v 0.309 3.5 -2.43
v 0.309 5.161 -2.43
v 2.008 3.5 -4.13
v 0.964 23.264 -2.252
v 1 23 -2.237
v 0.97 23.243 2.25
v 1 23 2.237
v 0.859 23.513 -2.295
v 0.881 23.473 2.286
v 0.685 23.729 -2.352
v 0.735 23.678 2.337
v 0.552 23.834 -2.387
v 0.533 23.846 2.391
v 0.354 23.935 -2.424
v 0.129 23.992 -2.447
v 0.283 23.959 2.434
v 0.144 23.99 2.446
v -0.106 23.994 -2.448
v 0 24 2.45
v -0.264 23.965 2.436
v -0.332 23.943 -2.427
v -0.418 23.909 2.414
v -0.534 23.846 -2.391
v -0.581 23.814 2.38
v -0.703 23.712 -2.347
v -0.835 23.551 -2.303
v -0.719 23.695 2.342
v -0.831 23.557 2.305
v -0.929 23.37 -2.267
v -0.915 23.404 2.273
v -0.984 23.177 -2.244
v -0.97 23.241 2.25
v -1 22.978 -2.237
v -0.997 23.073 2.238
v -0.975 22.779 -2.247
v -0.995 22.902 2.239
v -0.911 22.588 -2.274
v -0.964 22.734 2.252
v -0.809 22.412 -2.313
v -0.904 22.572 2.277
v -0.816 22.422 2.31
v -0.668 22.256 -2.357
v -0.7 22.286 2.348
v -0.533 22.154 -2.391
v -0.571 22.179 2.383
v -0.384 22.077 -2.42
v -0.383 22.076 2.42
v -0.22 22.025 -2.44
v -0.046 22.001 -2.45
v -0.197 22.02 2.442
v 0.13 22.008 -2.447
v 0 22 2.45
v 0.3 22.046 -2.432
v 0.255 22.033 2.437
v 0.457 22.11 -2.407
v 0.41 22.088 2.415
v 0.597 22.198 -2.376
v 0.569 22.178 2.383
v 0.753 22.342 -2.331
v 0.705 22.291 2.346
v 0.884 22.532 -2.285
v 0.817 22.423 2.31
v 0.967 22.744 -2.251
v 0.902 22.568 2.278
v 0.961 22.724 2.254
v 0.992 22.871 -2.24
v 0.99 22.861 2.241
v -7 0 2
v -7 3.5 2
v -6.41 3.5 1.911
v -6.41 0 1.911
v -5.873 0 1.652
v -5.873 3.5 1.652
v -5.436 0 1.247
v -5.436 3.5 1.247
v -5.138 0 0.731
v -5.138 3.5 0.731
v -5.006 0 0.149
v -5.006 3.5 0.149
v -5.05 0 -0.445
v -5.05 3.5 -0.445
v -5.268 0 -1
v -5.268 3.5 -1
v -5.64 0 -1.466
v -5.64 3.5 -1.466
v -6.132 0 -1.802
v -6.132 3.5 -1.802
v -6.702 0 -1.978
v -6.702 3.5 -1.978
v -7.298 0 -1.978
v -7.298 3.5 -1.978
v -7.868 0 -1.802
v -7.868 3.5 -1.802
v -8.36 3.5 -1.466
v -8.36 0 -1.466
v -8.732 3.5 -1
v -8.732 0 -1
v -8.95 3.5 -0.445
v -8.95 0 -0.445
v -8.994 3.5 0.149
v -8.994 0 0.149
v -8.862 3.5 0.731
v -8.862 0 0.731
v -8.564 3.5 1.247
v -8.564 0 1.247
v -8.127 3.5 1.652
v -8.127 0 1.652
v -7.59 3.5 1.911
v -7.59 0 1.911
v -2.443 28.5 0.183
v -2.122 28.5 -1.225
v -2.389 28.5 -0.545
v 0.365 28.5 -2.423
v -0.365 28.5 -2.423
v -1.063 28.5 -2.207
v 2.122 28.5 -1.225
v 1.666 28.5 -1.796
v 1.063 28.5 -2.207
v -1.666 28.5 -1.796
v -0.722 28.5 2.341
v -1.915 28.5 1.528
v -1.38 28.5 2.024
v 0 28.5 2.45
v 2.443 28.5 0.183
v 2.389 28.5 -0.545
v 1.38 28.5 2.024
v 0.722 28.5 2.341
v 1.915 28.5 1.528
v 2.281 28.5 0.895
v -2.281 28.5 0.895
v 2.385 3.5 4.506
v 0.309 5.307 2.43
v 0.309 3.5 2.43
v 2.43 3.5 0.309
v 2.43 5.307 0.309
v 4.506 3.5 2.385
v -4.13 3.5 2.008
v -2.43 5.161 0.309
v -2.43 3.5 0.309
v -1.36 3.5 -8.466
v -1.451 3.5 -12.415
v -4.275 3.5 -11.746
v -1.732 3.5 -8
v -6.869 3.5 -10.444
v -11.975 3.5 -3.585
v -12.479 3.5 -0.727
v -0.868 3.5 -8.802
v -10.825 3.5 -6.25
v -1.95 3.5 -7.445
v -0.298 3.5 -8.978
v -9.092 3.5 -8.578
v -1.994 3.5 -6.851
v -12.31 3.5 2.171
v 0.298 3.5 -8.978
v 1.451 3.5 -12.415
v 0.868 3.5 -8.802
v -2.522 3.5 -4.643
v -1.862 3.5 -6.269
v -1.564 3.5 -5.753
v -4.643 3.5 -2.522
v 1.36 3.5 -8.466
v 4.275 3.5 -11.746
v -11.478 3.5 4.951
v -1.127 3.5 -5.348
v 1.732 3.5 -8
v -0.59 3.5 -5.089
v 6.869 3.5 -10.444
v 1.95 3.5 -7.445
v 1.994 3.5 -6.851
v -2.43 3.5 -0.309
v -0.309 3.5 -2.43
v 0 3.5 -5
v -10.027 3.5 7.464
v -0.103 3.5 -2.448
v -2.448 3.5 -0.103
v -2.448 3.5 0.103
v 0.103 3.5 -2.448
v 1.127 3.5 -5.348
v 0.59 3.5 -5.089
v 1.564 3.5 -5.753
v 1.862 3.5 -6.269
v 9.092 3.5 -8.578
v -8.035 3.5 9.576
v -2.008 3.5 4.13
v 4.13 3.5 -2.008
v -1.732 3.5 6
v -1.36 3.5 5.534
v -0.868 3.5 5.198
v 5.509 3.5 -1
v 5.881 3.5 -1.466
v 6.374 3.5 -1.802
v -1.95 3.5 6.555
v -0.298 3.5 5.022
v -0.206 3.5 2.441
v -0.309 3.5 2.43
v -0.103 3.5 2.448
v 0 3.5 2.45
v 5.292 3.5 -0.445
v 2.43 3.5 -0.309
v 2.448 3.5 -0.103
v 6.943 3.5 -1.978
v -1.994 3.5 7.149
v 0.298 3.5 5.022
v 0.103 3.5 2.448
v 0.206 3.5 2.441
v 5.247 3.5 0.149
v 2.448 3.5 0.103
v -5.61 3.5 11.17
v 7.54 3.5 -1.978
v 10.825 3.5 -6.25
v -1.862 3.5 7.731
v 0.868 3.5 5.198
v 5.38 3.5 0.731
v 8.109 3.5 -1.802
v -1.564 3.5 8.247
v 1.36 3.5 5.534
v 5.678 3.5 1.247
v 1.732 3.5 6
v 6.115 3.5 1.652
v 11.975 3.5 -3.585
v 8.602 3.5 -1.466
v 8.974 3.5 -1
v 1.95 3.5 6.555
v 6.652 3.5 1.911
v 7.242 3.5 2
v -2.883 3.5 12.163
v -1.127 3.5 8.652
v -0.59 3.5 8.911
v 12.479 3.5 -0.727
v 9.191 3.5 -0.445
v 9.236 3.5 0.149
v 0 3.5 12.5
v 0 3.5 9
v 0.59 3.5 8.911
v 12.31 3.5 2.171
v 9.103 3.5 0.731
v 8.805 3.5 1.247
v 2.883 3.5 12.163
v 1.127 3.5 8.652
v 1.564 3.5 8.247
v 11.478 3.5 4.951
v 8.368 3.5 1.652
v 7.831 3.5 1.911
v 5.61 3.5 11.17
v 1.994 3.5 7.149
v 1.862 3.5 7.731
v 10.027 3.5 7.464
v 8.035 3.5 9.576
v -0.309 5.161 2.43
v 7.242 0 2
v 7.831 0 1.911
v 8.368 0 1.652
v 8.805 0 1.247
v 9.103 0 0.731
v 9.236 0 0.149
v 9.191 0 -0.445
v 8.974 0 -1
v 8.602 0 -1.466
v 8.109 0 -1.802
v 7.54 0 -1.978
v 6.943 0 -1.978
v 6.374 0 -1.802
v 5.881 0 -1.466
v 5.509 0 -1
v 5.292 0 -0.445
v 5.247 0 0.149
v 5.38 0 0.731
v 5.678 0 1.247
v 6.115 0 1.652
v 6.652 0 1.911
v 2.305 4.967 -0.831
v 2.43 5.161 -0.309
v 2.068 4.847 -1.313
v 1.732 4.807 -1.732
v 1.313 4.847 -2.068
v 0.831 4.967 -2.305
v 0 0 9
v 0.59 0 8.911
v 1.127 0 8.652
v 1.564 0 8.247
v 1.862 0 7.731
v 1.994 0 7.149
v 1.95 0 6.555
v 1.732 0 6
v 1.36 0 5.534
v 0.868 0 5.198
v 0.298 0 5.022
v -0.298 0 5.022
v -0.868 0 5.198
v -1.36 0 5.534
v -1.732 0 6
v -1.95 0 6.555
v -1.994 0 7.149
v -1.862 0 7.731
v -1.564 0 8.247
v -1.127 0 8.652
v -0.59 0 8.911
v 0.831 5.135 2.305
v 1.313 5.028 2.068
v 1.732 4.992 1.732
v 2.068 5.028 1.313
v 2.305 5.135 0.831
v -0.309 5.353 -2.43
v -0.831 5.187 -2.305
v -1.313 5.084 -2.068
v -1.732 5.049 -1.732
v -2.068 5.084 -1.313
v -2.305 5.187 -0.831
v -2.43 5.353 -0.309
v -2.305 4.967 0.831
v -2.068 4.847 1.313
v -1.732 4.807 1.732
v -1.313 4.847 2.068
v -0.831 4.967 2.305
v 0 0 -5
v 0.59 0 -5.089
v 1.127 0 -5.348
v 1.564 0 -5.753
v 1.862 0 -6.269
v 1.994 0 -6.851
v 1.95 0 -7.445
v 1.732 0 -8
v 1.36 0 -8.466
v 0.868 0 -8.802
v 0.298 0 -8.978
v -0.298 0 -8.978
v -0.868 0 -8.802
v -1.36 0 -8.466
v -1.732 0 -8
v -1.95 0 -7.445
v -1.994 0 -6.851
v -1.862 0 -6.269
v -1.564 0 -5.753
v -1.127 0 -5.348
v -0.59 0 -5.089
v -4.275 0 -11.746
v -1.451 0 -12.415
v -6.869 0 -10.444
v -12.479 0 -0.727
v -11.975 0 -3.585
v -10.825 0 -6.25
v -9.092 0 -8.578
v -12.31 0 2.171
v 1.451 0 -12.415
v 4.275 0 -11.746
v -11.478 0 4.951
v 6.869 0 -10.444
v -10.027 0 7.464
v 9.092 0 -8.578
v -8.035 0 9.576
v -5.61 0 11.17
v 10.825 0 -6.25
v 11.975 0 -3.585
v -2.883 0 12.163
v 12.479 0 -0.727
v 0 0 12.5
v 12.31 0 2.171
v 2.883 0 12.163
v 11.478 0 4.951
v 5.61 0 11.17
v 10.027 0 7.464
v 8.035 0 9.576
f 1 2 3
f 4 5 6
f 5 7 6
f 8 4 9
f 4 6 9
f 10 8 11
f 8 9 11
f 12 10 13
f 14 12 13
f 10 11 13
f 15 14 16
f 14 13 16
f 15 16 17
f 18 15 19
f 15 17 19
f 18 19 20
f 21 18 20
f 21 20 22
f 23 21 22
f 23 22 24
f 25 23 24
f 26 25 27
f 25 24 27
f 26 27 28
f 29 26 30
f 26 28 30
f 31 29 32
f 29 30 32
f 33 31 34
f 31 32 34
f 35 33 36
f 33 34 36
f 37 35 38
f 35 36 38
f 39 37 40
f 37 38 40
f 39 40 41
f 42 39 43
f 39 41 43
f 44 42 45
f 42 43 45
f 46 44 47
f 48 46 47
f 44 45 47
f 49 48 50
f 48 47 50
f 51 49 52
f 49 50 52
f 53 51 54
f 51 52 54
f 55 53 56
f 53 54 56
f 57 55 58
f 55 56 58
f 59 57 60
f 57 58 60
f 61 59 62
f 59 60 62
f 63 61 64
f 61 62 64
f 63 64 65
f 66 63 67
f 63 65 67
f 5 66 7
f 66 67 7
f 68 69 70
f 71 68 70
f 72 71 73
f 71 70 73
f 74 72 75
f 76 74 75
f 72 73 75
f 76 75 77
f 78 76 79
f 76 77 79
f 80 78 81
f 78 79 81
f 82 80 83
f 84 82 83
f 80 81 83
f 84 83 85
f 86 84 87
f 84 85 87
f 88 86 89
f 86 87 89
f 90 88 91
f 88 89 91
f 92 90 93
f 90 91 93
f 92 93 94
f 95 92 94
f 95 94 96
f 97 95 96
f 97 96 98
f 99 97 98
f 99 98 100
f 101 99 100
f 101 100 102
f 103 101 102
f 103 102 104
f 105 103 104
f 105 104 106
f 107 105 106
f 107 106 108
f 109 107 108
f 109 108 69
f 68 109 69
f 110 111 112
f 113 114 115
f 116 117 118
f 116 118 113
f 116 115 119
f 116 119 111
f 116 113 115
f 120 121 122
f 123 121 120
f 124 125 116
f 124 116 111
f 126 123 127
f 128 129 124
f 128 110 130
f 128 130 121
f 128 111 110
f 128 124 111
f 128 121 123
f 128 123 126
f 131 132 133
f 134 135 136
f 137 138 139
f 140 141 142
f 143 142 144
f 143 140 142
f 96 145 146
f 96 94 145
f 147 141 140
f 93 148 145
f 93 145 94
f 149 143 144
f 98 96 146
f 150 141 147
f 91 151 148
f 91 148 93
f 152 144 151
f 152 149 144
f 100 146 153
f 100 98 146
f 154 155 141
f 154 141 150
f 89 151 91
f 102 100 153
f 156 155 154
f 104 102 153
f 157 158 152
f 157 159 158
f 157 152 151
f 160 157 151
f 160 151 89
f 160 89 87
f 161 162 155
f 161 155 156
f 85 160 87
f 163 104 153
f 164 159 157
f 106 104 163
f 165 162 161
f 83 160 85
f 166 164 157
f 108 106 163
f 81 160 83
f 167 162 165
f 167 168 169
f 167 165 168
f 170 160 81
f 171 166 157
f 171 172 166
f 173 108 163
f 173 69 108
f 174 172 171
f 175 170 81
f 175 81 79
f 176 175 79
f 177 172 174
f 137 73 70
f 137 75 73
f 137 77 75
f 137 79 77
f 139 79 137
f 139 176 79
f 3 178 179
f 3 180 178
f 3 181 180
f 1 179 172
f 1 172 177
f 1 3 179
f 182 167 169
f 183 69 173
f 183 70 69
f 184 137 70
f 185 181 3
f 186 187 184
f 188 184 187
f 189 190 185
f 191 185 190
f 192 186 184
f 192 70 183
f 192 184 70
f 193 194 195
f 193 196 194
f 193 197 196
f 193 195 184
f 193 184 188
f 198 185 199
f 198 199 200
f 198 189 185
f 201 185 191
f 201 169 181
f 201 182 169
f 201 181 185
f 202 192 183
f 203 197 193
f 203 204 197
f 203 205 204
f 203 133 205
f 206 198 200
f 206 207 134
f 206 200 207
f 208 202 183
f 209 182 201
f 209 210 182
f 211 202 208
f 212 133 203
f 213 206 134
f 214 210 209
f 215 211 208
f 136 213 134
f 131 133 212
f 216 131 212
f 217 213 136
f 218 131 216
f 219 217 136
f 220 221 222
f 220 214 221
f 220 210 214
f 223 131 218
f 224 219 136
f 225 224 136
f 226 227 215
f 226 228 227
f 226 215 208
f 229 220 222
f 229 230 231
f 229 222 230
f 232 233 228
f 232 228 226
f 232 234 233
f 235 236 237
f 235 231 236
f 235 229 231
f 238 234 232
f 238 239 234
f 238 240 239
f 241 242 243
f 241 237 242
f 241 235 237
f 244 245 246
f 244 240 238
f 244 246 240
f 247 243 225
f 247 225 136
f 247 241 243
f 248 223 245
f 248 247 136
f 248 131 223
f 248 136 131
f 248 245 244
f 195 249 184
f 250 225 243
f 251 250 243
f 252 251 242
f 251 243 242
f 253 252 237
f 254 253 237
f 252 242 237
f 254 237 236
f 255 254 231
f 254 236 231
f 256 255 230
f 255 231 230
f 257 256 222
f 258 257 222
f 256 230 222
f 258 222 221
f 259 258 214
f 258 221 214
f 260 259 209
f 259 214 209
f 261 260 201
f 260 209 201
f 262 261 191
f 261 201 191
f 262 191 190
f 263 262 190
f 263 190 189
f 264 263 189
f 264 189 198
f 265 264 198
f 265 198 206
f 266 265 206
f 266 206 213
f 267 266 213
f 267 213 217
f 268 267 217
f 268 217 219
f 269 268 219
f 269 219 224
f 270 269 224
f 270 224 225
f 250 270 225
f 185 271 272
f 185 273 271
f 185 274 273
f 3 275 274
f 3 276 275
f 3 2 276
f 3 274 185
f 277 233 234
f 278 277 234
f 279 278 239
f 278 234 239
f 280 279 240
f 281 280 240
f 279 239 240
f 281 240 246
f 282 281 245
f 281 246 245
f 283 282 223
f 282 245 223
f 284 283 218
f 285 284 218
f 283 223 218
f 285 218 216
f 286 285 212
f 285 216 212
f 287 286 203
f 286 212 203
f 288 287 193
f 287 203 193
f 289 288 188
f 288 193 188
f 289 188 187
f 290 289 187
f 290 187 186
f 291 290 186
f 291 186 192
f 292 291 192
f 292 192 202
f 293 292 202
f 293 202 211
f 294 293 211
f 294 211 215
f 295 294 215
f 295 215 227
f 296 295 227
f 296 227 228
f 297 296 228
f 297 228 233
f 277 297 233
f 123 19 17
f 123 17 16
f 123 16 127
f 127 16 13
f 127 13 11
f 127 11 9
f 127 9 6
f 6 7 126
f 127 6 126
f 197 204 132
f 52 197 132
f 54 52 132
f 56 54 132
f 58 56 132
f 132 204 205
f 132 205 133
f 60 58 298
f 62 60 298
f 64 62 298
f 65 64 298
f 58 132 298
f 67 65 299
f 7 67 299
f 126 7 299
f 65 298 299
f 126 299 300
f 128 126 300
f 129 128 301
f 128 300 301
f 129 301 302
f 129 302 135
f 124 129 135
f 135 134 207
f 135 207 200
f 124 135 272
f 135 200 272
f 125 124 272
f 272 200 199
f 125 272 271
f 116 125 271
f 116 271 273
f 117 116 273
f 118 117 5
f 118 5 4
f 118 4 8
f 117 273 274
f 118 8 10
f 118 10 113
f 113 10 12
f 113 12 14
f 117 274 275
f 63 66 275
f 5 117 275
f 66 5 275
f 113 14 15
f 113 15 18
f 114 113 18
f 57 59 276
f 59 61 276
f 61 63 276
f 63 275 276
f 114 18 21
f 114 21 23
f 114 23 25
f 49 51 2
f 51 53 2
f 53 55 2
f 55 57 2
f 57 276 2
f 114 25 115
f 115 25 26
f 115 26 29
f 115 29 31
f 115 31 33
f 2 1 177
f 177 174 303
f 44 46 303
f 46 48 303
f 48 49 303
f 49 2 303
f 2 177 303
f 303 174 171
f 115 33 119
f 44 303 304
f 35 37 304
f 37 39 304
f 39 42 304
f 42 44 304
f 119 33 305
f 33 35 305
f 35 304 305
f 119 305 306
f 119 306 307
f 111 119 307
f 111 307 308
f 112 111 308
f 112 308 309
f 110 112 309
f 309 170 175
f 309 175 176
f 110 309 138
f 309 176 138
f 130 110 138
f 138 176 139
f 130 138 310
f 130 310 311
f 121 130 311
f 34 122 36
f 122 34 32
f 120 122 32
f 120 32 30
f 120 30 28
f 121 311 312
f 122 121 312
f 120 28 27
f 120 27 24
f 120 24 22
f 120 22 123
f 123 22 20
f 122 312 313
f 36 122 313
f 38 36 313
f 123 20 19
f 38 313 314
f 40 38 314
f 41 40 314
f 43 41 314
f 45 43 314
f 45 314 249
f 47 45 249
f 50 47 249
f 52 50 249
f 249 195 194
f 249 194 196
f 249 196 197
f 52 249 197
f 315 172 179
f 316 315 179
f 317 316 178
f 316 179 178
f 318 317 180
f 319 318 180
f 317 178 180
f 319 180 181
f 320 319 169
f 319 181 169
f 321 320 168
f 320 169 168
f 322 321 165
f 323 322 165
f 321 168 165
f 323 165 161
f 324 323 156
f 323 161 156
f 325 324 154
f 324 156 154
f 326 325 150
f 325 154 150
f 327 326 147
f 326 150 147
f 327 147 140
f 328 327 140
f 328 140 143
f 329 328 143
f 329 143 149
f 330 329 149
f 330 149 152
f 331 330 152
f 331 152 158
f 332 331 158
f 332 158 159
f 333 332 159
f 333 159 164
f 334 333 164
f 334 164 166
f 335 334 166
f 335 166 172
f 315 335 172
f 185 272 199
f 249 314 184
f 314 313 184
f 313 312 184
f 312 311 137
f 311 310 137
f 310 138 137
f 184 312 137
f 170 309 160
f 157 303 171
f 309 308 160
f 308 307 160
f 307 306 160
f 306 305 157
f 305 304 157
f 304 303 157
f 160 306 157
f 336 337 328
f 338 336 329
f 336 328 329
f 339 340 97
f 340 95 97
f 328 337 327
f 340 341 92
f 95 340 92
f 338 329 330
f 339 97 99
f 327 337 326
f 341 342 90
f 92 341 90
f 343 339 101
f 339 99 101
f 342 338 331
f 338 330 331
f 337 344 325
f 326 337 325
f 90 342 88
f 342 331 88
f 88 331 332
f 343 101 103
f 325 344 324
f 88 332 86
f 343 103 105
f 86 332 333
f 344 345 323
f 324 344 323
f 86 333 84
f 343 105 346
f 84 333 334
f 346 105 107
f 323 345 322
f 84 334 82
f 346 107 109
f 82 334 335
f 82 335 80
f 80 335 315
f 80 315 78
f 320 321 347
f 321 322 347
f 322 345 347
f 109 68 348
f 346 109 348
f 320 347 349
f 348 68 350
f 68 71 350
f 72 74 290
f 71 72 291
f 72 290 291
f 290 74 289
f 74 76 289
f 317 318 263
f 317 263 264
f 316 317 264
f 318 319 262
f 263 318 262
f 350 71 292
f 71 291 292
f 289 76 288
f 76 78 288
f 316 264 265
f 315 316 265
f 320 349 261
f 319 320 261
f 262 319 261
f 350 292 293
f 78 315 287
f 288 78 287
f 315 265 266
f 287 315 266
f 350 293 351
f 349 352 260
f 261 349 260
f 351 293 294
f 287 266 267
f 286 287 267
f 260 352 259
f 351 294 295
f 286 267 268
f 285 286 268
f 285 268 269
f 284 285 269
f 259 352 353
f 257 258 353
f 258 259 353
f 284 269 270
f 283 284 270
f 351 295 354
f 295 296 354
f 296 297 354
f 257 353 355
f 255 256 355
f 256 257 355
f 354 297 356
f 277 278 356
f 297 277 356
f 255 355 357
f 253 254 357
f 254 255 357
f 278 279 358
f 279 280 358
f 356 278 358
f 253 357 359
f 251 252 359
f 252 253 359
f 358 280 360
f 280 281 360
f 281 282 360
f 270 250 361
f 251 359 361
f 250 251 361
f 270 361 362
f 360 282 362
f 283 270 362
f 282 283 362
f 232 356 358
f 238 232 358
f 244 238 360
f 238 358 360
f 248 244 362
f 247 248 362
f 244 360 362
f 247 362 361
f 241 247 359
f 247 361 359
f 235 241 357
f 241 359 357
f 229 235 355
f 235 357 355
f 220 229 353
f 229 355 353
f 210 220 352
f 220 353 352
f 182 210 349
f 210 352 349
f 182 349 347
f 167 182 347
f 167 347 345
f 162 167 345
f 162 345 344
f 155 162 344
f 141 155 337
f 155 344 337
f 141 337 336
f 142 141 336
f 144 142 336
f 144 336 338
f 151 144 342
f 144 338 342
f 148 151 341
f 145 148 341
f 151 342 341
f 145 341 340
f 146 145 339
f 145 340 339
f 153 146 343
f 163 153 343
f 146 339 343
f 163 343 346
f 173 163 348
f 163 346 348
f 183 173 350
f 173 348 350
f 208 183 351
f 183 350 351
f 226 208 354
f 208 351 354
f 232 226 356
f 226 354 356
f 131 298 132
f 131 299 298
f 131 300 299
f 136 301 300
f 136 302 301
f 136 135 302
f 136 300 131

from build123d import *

# Parameters (mm, degrees)
SKETCH_1_R               = 12.5
EXTRUDE_1_DEPTH          = 3.5
SKETCH_2_R               = 2.45
EXTRUDE_2_DEPTH          = 25
SKETCH_4_R               = 2
CUT_EXTRUDE_1_DEPTH      = 31.618621785
SKETCH_4_5_R             = 2
CUT_EXTRUDE_2_DEPTH      = 31.618621785
RIB_1_REACH              = 35.537
SKETCH_8_WALL_W          = 74.969434882
SKETCH_8_WALL_H          = 3
RIB_6_REACH              = 35.537
SKETCH_9_WALL_W          = 75.07458535
SKETCH_9_WALL_H          = 3
RIB_7_REACH              = 35.537
SKETCH_11_WALL_W         = 75.144527038
SKETCH_11_WALL_H         = 3
CUT_EXTRUDE_4_DEPTH      = 30.008619409
CUT_EXTRUDE_4_DEPTH_BACK = 30.008619409
SKETCH_3D_7_R            = 1


with BuildPart() as part:
    # 草图1 → 凸台-拉伸1 (new body)
    with BuildSketch(Plane(origin=(0, 0, 0), x_dir=(1, 0, 0), z_dir=(0, 1, 0))):
        Circle(SKETCH_1_R)
    extrude(amount=EXTRUDE_1_DEPTH)

    # 草图2 → 凸台-拉伸2 (add)
    with BuildSketch(Plane(origin=(0, 3.5, 0), x_dir=(1, 0, 0), z_dir=(0, 1, 0))):
        Circle(SKETCH_2_R)
    extrude(amount=EXTRUDE_2_DEPTH)

    # 草图4 → 切除-拉伸1 (cut, through all)
    with BuildSketch(Plane(origin=(0, 3.5, 0), x_dir=(1, 0, 0), z_dir=(0, 1, 0))):
        with Locations((0, 7)):
            Circle(SKETCH_4_R)
    extrude(amount=-CUT_EXTRUDE_1_DEPTH, mode=Mode.SUBTRACT)

    # 草图4<5> → 切除-拉伸2 (cut, through all)
    with BuildSketch(Plane(origin=(0, 3.5, 0), x_dir=(1, 0, 0), z_dir=(0, 1, 0))):
        with Locations((7.241500052, 0)):
            Circle(SKETCH_4_5_R)
        with Locations((-7, 0)):
            Circle(SKETCH_4_5_R)
        with Locations((0, -7)):
            Circle(SKETCH_4_5_R)
    extrude(amount=-CUT_EXTRUDE_2_DEPTH, mode=Mode.SUBTRACT)

    # 草图8 wall → 筋1 (add, up to next)
    with BuildSketch(Plane(origin=(1.774725891, 4.95468166, 1.774725891), x_dir=(0.602127630795, -0.524294413919, 0.602127630795), z_dir=(0.37073213542, 0.85153706175, 0.37073213542)), mode=Mode.PRIVATE) as rib_1_sk1:
        Rectangle(SKETCH_8_WALL_W, SKETCH_8_WALL_H)
    rib_1_tool1 = extrude(rib_1_sk1.sketch, amount=-RIB_1_REACH, mode=Mode.PRIVATE) - part.part
    add(rib_1_tool1.solids().sort_by_distance((1.774725891, 4.95468166, 1.774725891))[0])

    # 草图9 wall → 筋6 (add, up to next)
    with BuildSketch(Plane(origin=(-1.825339457, 4.971513253, -1.825339457), x_dir=(-0.608446485545, -0.509495582371, -0.608446485545), z_dir=(0.360267781279, -0.860473271836, 0.360267781279)), mode=Mode.PRIVATE) as rib_6_sk1:
        Rectangle(SKETCH_9_WALL_W, SKETCH_9_WALL_H)
    rib_6_tool1 = extrude(rib_6_sk1.sketch, amount=RIB_6_REACH, mode=Mode.PRIVATE) - part.part
    add(rib_6_tool1.solids().sort_by_distance((-1.825339457, 4.971513253, -1.825339457))[0])

    # 草图11 wall → 筋7 (add, up to next)
    with BuildSketch(Plane(origin=(1.765395484, 4.77436806, -1.765395484), x_dir=(0.581684495472, -0.568582707664, -0.581684495472), z_dir=(0.402048688254, 0.822626102519, -0.402048688254)), mode=Mode.PRIVATE) as rib_7_sk1:
        Rectangle(SKETCH_11_WALL_W, SKETCH_11_WALL_H)
    rib_7_tool1 = extrude(rib_7_sk1.sketch, amount=-RIB_7_REACH, mode=Mode.PRIVATE) - part.part
    rib_7 = rib_7_tool1.solids().sort_by_distance((1.765395484, 4.77436806, -1.765395484))[0]
    add(rib_7)

    # 镜向1: 筋7 across plane
    add(rib_7.mirror(Plane(origin=(0, 0, 0), x_dir=(0.7071067811865465, 0, 0.7071067811865486), z_dir=(-0.7071067811865488, 0, 0.7071067811865464))))

    # Sketch 3D_7 → 切除-拉伸4 (cut, two sides: drawn at the far end of the back side and taken through both)
    with BuildSketch(Plane(origin=(0, 23, 0), x_dir=(0, 1, 0), z_dir=(0, 0, -1)).offset(-CUT_EXTRUDE_4_DEPTH_BACK)):
        Circle(SKETCH_3D_7_R)
    extrude(amount=CUT_EXTRUDE_4_DEPTH + CUT_EXTRUDE_4_DEPTH_BACK, mode=Mode.SUBTRACT)


solid = part.part
